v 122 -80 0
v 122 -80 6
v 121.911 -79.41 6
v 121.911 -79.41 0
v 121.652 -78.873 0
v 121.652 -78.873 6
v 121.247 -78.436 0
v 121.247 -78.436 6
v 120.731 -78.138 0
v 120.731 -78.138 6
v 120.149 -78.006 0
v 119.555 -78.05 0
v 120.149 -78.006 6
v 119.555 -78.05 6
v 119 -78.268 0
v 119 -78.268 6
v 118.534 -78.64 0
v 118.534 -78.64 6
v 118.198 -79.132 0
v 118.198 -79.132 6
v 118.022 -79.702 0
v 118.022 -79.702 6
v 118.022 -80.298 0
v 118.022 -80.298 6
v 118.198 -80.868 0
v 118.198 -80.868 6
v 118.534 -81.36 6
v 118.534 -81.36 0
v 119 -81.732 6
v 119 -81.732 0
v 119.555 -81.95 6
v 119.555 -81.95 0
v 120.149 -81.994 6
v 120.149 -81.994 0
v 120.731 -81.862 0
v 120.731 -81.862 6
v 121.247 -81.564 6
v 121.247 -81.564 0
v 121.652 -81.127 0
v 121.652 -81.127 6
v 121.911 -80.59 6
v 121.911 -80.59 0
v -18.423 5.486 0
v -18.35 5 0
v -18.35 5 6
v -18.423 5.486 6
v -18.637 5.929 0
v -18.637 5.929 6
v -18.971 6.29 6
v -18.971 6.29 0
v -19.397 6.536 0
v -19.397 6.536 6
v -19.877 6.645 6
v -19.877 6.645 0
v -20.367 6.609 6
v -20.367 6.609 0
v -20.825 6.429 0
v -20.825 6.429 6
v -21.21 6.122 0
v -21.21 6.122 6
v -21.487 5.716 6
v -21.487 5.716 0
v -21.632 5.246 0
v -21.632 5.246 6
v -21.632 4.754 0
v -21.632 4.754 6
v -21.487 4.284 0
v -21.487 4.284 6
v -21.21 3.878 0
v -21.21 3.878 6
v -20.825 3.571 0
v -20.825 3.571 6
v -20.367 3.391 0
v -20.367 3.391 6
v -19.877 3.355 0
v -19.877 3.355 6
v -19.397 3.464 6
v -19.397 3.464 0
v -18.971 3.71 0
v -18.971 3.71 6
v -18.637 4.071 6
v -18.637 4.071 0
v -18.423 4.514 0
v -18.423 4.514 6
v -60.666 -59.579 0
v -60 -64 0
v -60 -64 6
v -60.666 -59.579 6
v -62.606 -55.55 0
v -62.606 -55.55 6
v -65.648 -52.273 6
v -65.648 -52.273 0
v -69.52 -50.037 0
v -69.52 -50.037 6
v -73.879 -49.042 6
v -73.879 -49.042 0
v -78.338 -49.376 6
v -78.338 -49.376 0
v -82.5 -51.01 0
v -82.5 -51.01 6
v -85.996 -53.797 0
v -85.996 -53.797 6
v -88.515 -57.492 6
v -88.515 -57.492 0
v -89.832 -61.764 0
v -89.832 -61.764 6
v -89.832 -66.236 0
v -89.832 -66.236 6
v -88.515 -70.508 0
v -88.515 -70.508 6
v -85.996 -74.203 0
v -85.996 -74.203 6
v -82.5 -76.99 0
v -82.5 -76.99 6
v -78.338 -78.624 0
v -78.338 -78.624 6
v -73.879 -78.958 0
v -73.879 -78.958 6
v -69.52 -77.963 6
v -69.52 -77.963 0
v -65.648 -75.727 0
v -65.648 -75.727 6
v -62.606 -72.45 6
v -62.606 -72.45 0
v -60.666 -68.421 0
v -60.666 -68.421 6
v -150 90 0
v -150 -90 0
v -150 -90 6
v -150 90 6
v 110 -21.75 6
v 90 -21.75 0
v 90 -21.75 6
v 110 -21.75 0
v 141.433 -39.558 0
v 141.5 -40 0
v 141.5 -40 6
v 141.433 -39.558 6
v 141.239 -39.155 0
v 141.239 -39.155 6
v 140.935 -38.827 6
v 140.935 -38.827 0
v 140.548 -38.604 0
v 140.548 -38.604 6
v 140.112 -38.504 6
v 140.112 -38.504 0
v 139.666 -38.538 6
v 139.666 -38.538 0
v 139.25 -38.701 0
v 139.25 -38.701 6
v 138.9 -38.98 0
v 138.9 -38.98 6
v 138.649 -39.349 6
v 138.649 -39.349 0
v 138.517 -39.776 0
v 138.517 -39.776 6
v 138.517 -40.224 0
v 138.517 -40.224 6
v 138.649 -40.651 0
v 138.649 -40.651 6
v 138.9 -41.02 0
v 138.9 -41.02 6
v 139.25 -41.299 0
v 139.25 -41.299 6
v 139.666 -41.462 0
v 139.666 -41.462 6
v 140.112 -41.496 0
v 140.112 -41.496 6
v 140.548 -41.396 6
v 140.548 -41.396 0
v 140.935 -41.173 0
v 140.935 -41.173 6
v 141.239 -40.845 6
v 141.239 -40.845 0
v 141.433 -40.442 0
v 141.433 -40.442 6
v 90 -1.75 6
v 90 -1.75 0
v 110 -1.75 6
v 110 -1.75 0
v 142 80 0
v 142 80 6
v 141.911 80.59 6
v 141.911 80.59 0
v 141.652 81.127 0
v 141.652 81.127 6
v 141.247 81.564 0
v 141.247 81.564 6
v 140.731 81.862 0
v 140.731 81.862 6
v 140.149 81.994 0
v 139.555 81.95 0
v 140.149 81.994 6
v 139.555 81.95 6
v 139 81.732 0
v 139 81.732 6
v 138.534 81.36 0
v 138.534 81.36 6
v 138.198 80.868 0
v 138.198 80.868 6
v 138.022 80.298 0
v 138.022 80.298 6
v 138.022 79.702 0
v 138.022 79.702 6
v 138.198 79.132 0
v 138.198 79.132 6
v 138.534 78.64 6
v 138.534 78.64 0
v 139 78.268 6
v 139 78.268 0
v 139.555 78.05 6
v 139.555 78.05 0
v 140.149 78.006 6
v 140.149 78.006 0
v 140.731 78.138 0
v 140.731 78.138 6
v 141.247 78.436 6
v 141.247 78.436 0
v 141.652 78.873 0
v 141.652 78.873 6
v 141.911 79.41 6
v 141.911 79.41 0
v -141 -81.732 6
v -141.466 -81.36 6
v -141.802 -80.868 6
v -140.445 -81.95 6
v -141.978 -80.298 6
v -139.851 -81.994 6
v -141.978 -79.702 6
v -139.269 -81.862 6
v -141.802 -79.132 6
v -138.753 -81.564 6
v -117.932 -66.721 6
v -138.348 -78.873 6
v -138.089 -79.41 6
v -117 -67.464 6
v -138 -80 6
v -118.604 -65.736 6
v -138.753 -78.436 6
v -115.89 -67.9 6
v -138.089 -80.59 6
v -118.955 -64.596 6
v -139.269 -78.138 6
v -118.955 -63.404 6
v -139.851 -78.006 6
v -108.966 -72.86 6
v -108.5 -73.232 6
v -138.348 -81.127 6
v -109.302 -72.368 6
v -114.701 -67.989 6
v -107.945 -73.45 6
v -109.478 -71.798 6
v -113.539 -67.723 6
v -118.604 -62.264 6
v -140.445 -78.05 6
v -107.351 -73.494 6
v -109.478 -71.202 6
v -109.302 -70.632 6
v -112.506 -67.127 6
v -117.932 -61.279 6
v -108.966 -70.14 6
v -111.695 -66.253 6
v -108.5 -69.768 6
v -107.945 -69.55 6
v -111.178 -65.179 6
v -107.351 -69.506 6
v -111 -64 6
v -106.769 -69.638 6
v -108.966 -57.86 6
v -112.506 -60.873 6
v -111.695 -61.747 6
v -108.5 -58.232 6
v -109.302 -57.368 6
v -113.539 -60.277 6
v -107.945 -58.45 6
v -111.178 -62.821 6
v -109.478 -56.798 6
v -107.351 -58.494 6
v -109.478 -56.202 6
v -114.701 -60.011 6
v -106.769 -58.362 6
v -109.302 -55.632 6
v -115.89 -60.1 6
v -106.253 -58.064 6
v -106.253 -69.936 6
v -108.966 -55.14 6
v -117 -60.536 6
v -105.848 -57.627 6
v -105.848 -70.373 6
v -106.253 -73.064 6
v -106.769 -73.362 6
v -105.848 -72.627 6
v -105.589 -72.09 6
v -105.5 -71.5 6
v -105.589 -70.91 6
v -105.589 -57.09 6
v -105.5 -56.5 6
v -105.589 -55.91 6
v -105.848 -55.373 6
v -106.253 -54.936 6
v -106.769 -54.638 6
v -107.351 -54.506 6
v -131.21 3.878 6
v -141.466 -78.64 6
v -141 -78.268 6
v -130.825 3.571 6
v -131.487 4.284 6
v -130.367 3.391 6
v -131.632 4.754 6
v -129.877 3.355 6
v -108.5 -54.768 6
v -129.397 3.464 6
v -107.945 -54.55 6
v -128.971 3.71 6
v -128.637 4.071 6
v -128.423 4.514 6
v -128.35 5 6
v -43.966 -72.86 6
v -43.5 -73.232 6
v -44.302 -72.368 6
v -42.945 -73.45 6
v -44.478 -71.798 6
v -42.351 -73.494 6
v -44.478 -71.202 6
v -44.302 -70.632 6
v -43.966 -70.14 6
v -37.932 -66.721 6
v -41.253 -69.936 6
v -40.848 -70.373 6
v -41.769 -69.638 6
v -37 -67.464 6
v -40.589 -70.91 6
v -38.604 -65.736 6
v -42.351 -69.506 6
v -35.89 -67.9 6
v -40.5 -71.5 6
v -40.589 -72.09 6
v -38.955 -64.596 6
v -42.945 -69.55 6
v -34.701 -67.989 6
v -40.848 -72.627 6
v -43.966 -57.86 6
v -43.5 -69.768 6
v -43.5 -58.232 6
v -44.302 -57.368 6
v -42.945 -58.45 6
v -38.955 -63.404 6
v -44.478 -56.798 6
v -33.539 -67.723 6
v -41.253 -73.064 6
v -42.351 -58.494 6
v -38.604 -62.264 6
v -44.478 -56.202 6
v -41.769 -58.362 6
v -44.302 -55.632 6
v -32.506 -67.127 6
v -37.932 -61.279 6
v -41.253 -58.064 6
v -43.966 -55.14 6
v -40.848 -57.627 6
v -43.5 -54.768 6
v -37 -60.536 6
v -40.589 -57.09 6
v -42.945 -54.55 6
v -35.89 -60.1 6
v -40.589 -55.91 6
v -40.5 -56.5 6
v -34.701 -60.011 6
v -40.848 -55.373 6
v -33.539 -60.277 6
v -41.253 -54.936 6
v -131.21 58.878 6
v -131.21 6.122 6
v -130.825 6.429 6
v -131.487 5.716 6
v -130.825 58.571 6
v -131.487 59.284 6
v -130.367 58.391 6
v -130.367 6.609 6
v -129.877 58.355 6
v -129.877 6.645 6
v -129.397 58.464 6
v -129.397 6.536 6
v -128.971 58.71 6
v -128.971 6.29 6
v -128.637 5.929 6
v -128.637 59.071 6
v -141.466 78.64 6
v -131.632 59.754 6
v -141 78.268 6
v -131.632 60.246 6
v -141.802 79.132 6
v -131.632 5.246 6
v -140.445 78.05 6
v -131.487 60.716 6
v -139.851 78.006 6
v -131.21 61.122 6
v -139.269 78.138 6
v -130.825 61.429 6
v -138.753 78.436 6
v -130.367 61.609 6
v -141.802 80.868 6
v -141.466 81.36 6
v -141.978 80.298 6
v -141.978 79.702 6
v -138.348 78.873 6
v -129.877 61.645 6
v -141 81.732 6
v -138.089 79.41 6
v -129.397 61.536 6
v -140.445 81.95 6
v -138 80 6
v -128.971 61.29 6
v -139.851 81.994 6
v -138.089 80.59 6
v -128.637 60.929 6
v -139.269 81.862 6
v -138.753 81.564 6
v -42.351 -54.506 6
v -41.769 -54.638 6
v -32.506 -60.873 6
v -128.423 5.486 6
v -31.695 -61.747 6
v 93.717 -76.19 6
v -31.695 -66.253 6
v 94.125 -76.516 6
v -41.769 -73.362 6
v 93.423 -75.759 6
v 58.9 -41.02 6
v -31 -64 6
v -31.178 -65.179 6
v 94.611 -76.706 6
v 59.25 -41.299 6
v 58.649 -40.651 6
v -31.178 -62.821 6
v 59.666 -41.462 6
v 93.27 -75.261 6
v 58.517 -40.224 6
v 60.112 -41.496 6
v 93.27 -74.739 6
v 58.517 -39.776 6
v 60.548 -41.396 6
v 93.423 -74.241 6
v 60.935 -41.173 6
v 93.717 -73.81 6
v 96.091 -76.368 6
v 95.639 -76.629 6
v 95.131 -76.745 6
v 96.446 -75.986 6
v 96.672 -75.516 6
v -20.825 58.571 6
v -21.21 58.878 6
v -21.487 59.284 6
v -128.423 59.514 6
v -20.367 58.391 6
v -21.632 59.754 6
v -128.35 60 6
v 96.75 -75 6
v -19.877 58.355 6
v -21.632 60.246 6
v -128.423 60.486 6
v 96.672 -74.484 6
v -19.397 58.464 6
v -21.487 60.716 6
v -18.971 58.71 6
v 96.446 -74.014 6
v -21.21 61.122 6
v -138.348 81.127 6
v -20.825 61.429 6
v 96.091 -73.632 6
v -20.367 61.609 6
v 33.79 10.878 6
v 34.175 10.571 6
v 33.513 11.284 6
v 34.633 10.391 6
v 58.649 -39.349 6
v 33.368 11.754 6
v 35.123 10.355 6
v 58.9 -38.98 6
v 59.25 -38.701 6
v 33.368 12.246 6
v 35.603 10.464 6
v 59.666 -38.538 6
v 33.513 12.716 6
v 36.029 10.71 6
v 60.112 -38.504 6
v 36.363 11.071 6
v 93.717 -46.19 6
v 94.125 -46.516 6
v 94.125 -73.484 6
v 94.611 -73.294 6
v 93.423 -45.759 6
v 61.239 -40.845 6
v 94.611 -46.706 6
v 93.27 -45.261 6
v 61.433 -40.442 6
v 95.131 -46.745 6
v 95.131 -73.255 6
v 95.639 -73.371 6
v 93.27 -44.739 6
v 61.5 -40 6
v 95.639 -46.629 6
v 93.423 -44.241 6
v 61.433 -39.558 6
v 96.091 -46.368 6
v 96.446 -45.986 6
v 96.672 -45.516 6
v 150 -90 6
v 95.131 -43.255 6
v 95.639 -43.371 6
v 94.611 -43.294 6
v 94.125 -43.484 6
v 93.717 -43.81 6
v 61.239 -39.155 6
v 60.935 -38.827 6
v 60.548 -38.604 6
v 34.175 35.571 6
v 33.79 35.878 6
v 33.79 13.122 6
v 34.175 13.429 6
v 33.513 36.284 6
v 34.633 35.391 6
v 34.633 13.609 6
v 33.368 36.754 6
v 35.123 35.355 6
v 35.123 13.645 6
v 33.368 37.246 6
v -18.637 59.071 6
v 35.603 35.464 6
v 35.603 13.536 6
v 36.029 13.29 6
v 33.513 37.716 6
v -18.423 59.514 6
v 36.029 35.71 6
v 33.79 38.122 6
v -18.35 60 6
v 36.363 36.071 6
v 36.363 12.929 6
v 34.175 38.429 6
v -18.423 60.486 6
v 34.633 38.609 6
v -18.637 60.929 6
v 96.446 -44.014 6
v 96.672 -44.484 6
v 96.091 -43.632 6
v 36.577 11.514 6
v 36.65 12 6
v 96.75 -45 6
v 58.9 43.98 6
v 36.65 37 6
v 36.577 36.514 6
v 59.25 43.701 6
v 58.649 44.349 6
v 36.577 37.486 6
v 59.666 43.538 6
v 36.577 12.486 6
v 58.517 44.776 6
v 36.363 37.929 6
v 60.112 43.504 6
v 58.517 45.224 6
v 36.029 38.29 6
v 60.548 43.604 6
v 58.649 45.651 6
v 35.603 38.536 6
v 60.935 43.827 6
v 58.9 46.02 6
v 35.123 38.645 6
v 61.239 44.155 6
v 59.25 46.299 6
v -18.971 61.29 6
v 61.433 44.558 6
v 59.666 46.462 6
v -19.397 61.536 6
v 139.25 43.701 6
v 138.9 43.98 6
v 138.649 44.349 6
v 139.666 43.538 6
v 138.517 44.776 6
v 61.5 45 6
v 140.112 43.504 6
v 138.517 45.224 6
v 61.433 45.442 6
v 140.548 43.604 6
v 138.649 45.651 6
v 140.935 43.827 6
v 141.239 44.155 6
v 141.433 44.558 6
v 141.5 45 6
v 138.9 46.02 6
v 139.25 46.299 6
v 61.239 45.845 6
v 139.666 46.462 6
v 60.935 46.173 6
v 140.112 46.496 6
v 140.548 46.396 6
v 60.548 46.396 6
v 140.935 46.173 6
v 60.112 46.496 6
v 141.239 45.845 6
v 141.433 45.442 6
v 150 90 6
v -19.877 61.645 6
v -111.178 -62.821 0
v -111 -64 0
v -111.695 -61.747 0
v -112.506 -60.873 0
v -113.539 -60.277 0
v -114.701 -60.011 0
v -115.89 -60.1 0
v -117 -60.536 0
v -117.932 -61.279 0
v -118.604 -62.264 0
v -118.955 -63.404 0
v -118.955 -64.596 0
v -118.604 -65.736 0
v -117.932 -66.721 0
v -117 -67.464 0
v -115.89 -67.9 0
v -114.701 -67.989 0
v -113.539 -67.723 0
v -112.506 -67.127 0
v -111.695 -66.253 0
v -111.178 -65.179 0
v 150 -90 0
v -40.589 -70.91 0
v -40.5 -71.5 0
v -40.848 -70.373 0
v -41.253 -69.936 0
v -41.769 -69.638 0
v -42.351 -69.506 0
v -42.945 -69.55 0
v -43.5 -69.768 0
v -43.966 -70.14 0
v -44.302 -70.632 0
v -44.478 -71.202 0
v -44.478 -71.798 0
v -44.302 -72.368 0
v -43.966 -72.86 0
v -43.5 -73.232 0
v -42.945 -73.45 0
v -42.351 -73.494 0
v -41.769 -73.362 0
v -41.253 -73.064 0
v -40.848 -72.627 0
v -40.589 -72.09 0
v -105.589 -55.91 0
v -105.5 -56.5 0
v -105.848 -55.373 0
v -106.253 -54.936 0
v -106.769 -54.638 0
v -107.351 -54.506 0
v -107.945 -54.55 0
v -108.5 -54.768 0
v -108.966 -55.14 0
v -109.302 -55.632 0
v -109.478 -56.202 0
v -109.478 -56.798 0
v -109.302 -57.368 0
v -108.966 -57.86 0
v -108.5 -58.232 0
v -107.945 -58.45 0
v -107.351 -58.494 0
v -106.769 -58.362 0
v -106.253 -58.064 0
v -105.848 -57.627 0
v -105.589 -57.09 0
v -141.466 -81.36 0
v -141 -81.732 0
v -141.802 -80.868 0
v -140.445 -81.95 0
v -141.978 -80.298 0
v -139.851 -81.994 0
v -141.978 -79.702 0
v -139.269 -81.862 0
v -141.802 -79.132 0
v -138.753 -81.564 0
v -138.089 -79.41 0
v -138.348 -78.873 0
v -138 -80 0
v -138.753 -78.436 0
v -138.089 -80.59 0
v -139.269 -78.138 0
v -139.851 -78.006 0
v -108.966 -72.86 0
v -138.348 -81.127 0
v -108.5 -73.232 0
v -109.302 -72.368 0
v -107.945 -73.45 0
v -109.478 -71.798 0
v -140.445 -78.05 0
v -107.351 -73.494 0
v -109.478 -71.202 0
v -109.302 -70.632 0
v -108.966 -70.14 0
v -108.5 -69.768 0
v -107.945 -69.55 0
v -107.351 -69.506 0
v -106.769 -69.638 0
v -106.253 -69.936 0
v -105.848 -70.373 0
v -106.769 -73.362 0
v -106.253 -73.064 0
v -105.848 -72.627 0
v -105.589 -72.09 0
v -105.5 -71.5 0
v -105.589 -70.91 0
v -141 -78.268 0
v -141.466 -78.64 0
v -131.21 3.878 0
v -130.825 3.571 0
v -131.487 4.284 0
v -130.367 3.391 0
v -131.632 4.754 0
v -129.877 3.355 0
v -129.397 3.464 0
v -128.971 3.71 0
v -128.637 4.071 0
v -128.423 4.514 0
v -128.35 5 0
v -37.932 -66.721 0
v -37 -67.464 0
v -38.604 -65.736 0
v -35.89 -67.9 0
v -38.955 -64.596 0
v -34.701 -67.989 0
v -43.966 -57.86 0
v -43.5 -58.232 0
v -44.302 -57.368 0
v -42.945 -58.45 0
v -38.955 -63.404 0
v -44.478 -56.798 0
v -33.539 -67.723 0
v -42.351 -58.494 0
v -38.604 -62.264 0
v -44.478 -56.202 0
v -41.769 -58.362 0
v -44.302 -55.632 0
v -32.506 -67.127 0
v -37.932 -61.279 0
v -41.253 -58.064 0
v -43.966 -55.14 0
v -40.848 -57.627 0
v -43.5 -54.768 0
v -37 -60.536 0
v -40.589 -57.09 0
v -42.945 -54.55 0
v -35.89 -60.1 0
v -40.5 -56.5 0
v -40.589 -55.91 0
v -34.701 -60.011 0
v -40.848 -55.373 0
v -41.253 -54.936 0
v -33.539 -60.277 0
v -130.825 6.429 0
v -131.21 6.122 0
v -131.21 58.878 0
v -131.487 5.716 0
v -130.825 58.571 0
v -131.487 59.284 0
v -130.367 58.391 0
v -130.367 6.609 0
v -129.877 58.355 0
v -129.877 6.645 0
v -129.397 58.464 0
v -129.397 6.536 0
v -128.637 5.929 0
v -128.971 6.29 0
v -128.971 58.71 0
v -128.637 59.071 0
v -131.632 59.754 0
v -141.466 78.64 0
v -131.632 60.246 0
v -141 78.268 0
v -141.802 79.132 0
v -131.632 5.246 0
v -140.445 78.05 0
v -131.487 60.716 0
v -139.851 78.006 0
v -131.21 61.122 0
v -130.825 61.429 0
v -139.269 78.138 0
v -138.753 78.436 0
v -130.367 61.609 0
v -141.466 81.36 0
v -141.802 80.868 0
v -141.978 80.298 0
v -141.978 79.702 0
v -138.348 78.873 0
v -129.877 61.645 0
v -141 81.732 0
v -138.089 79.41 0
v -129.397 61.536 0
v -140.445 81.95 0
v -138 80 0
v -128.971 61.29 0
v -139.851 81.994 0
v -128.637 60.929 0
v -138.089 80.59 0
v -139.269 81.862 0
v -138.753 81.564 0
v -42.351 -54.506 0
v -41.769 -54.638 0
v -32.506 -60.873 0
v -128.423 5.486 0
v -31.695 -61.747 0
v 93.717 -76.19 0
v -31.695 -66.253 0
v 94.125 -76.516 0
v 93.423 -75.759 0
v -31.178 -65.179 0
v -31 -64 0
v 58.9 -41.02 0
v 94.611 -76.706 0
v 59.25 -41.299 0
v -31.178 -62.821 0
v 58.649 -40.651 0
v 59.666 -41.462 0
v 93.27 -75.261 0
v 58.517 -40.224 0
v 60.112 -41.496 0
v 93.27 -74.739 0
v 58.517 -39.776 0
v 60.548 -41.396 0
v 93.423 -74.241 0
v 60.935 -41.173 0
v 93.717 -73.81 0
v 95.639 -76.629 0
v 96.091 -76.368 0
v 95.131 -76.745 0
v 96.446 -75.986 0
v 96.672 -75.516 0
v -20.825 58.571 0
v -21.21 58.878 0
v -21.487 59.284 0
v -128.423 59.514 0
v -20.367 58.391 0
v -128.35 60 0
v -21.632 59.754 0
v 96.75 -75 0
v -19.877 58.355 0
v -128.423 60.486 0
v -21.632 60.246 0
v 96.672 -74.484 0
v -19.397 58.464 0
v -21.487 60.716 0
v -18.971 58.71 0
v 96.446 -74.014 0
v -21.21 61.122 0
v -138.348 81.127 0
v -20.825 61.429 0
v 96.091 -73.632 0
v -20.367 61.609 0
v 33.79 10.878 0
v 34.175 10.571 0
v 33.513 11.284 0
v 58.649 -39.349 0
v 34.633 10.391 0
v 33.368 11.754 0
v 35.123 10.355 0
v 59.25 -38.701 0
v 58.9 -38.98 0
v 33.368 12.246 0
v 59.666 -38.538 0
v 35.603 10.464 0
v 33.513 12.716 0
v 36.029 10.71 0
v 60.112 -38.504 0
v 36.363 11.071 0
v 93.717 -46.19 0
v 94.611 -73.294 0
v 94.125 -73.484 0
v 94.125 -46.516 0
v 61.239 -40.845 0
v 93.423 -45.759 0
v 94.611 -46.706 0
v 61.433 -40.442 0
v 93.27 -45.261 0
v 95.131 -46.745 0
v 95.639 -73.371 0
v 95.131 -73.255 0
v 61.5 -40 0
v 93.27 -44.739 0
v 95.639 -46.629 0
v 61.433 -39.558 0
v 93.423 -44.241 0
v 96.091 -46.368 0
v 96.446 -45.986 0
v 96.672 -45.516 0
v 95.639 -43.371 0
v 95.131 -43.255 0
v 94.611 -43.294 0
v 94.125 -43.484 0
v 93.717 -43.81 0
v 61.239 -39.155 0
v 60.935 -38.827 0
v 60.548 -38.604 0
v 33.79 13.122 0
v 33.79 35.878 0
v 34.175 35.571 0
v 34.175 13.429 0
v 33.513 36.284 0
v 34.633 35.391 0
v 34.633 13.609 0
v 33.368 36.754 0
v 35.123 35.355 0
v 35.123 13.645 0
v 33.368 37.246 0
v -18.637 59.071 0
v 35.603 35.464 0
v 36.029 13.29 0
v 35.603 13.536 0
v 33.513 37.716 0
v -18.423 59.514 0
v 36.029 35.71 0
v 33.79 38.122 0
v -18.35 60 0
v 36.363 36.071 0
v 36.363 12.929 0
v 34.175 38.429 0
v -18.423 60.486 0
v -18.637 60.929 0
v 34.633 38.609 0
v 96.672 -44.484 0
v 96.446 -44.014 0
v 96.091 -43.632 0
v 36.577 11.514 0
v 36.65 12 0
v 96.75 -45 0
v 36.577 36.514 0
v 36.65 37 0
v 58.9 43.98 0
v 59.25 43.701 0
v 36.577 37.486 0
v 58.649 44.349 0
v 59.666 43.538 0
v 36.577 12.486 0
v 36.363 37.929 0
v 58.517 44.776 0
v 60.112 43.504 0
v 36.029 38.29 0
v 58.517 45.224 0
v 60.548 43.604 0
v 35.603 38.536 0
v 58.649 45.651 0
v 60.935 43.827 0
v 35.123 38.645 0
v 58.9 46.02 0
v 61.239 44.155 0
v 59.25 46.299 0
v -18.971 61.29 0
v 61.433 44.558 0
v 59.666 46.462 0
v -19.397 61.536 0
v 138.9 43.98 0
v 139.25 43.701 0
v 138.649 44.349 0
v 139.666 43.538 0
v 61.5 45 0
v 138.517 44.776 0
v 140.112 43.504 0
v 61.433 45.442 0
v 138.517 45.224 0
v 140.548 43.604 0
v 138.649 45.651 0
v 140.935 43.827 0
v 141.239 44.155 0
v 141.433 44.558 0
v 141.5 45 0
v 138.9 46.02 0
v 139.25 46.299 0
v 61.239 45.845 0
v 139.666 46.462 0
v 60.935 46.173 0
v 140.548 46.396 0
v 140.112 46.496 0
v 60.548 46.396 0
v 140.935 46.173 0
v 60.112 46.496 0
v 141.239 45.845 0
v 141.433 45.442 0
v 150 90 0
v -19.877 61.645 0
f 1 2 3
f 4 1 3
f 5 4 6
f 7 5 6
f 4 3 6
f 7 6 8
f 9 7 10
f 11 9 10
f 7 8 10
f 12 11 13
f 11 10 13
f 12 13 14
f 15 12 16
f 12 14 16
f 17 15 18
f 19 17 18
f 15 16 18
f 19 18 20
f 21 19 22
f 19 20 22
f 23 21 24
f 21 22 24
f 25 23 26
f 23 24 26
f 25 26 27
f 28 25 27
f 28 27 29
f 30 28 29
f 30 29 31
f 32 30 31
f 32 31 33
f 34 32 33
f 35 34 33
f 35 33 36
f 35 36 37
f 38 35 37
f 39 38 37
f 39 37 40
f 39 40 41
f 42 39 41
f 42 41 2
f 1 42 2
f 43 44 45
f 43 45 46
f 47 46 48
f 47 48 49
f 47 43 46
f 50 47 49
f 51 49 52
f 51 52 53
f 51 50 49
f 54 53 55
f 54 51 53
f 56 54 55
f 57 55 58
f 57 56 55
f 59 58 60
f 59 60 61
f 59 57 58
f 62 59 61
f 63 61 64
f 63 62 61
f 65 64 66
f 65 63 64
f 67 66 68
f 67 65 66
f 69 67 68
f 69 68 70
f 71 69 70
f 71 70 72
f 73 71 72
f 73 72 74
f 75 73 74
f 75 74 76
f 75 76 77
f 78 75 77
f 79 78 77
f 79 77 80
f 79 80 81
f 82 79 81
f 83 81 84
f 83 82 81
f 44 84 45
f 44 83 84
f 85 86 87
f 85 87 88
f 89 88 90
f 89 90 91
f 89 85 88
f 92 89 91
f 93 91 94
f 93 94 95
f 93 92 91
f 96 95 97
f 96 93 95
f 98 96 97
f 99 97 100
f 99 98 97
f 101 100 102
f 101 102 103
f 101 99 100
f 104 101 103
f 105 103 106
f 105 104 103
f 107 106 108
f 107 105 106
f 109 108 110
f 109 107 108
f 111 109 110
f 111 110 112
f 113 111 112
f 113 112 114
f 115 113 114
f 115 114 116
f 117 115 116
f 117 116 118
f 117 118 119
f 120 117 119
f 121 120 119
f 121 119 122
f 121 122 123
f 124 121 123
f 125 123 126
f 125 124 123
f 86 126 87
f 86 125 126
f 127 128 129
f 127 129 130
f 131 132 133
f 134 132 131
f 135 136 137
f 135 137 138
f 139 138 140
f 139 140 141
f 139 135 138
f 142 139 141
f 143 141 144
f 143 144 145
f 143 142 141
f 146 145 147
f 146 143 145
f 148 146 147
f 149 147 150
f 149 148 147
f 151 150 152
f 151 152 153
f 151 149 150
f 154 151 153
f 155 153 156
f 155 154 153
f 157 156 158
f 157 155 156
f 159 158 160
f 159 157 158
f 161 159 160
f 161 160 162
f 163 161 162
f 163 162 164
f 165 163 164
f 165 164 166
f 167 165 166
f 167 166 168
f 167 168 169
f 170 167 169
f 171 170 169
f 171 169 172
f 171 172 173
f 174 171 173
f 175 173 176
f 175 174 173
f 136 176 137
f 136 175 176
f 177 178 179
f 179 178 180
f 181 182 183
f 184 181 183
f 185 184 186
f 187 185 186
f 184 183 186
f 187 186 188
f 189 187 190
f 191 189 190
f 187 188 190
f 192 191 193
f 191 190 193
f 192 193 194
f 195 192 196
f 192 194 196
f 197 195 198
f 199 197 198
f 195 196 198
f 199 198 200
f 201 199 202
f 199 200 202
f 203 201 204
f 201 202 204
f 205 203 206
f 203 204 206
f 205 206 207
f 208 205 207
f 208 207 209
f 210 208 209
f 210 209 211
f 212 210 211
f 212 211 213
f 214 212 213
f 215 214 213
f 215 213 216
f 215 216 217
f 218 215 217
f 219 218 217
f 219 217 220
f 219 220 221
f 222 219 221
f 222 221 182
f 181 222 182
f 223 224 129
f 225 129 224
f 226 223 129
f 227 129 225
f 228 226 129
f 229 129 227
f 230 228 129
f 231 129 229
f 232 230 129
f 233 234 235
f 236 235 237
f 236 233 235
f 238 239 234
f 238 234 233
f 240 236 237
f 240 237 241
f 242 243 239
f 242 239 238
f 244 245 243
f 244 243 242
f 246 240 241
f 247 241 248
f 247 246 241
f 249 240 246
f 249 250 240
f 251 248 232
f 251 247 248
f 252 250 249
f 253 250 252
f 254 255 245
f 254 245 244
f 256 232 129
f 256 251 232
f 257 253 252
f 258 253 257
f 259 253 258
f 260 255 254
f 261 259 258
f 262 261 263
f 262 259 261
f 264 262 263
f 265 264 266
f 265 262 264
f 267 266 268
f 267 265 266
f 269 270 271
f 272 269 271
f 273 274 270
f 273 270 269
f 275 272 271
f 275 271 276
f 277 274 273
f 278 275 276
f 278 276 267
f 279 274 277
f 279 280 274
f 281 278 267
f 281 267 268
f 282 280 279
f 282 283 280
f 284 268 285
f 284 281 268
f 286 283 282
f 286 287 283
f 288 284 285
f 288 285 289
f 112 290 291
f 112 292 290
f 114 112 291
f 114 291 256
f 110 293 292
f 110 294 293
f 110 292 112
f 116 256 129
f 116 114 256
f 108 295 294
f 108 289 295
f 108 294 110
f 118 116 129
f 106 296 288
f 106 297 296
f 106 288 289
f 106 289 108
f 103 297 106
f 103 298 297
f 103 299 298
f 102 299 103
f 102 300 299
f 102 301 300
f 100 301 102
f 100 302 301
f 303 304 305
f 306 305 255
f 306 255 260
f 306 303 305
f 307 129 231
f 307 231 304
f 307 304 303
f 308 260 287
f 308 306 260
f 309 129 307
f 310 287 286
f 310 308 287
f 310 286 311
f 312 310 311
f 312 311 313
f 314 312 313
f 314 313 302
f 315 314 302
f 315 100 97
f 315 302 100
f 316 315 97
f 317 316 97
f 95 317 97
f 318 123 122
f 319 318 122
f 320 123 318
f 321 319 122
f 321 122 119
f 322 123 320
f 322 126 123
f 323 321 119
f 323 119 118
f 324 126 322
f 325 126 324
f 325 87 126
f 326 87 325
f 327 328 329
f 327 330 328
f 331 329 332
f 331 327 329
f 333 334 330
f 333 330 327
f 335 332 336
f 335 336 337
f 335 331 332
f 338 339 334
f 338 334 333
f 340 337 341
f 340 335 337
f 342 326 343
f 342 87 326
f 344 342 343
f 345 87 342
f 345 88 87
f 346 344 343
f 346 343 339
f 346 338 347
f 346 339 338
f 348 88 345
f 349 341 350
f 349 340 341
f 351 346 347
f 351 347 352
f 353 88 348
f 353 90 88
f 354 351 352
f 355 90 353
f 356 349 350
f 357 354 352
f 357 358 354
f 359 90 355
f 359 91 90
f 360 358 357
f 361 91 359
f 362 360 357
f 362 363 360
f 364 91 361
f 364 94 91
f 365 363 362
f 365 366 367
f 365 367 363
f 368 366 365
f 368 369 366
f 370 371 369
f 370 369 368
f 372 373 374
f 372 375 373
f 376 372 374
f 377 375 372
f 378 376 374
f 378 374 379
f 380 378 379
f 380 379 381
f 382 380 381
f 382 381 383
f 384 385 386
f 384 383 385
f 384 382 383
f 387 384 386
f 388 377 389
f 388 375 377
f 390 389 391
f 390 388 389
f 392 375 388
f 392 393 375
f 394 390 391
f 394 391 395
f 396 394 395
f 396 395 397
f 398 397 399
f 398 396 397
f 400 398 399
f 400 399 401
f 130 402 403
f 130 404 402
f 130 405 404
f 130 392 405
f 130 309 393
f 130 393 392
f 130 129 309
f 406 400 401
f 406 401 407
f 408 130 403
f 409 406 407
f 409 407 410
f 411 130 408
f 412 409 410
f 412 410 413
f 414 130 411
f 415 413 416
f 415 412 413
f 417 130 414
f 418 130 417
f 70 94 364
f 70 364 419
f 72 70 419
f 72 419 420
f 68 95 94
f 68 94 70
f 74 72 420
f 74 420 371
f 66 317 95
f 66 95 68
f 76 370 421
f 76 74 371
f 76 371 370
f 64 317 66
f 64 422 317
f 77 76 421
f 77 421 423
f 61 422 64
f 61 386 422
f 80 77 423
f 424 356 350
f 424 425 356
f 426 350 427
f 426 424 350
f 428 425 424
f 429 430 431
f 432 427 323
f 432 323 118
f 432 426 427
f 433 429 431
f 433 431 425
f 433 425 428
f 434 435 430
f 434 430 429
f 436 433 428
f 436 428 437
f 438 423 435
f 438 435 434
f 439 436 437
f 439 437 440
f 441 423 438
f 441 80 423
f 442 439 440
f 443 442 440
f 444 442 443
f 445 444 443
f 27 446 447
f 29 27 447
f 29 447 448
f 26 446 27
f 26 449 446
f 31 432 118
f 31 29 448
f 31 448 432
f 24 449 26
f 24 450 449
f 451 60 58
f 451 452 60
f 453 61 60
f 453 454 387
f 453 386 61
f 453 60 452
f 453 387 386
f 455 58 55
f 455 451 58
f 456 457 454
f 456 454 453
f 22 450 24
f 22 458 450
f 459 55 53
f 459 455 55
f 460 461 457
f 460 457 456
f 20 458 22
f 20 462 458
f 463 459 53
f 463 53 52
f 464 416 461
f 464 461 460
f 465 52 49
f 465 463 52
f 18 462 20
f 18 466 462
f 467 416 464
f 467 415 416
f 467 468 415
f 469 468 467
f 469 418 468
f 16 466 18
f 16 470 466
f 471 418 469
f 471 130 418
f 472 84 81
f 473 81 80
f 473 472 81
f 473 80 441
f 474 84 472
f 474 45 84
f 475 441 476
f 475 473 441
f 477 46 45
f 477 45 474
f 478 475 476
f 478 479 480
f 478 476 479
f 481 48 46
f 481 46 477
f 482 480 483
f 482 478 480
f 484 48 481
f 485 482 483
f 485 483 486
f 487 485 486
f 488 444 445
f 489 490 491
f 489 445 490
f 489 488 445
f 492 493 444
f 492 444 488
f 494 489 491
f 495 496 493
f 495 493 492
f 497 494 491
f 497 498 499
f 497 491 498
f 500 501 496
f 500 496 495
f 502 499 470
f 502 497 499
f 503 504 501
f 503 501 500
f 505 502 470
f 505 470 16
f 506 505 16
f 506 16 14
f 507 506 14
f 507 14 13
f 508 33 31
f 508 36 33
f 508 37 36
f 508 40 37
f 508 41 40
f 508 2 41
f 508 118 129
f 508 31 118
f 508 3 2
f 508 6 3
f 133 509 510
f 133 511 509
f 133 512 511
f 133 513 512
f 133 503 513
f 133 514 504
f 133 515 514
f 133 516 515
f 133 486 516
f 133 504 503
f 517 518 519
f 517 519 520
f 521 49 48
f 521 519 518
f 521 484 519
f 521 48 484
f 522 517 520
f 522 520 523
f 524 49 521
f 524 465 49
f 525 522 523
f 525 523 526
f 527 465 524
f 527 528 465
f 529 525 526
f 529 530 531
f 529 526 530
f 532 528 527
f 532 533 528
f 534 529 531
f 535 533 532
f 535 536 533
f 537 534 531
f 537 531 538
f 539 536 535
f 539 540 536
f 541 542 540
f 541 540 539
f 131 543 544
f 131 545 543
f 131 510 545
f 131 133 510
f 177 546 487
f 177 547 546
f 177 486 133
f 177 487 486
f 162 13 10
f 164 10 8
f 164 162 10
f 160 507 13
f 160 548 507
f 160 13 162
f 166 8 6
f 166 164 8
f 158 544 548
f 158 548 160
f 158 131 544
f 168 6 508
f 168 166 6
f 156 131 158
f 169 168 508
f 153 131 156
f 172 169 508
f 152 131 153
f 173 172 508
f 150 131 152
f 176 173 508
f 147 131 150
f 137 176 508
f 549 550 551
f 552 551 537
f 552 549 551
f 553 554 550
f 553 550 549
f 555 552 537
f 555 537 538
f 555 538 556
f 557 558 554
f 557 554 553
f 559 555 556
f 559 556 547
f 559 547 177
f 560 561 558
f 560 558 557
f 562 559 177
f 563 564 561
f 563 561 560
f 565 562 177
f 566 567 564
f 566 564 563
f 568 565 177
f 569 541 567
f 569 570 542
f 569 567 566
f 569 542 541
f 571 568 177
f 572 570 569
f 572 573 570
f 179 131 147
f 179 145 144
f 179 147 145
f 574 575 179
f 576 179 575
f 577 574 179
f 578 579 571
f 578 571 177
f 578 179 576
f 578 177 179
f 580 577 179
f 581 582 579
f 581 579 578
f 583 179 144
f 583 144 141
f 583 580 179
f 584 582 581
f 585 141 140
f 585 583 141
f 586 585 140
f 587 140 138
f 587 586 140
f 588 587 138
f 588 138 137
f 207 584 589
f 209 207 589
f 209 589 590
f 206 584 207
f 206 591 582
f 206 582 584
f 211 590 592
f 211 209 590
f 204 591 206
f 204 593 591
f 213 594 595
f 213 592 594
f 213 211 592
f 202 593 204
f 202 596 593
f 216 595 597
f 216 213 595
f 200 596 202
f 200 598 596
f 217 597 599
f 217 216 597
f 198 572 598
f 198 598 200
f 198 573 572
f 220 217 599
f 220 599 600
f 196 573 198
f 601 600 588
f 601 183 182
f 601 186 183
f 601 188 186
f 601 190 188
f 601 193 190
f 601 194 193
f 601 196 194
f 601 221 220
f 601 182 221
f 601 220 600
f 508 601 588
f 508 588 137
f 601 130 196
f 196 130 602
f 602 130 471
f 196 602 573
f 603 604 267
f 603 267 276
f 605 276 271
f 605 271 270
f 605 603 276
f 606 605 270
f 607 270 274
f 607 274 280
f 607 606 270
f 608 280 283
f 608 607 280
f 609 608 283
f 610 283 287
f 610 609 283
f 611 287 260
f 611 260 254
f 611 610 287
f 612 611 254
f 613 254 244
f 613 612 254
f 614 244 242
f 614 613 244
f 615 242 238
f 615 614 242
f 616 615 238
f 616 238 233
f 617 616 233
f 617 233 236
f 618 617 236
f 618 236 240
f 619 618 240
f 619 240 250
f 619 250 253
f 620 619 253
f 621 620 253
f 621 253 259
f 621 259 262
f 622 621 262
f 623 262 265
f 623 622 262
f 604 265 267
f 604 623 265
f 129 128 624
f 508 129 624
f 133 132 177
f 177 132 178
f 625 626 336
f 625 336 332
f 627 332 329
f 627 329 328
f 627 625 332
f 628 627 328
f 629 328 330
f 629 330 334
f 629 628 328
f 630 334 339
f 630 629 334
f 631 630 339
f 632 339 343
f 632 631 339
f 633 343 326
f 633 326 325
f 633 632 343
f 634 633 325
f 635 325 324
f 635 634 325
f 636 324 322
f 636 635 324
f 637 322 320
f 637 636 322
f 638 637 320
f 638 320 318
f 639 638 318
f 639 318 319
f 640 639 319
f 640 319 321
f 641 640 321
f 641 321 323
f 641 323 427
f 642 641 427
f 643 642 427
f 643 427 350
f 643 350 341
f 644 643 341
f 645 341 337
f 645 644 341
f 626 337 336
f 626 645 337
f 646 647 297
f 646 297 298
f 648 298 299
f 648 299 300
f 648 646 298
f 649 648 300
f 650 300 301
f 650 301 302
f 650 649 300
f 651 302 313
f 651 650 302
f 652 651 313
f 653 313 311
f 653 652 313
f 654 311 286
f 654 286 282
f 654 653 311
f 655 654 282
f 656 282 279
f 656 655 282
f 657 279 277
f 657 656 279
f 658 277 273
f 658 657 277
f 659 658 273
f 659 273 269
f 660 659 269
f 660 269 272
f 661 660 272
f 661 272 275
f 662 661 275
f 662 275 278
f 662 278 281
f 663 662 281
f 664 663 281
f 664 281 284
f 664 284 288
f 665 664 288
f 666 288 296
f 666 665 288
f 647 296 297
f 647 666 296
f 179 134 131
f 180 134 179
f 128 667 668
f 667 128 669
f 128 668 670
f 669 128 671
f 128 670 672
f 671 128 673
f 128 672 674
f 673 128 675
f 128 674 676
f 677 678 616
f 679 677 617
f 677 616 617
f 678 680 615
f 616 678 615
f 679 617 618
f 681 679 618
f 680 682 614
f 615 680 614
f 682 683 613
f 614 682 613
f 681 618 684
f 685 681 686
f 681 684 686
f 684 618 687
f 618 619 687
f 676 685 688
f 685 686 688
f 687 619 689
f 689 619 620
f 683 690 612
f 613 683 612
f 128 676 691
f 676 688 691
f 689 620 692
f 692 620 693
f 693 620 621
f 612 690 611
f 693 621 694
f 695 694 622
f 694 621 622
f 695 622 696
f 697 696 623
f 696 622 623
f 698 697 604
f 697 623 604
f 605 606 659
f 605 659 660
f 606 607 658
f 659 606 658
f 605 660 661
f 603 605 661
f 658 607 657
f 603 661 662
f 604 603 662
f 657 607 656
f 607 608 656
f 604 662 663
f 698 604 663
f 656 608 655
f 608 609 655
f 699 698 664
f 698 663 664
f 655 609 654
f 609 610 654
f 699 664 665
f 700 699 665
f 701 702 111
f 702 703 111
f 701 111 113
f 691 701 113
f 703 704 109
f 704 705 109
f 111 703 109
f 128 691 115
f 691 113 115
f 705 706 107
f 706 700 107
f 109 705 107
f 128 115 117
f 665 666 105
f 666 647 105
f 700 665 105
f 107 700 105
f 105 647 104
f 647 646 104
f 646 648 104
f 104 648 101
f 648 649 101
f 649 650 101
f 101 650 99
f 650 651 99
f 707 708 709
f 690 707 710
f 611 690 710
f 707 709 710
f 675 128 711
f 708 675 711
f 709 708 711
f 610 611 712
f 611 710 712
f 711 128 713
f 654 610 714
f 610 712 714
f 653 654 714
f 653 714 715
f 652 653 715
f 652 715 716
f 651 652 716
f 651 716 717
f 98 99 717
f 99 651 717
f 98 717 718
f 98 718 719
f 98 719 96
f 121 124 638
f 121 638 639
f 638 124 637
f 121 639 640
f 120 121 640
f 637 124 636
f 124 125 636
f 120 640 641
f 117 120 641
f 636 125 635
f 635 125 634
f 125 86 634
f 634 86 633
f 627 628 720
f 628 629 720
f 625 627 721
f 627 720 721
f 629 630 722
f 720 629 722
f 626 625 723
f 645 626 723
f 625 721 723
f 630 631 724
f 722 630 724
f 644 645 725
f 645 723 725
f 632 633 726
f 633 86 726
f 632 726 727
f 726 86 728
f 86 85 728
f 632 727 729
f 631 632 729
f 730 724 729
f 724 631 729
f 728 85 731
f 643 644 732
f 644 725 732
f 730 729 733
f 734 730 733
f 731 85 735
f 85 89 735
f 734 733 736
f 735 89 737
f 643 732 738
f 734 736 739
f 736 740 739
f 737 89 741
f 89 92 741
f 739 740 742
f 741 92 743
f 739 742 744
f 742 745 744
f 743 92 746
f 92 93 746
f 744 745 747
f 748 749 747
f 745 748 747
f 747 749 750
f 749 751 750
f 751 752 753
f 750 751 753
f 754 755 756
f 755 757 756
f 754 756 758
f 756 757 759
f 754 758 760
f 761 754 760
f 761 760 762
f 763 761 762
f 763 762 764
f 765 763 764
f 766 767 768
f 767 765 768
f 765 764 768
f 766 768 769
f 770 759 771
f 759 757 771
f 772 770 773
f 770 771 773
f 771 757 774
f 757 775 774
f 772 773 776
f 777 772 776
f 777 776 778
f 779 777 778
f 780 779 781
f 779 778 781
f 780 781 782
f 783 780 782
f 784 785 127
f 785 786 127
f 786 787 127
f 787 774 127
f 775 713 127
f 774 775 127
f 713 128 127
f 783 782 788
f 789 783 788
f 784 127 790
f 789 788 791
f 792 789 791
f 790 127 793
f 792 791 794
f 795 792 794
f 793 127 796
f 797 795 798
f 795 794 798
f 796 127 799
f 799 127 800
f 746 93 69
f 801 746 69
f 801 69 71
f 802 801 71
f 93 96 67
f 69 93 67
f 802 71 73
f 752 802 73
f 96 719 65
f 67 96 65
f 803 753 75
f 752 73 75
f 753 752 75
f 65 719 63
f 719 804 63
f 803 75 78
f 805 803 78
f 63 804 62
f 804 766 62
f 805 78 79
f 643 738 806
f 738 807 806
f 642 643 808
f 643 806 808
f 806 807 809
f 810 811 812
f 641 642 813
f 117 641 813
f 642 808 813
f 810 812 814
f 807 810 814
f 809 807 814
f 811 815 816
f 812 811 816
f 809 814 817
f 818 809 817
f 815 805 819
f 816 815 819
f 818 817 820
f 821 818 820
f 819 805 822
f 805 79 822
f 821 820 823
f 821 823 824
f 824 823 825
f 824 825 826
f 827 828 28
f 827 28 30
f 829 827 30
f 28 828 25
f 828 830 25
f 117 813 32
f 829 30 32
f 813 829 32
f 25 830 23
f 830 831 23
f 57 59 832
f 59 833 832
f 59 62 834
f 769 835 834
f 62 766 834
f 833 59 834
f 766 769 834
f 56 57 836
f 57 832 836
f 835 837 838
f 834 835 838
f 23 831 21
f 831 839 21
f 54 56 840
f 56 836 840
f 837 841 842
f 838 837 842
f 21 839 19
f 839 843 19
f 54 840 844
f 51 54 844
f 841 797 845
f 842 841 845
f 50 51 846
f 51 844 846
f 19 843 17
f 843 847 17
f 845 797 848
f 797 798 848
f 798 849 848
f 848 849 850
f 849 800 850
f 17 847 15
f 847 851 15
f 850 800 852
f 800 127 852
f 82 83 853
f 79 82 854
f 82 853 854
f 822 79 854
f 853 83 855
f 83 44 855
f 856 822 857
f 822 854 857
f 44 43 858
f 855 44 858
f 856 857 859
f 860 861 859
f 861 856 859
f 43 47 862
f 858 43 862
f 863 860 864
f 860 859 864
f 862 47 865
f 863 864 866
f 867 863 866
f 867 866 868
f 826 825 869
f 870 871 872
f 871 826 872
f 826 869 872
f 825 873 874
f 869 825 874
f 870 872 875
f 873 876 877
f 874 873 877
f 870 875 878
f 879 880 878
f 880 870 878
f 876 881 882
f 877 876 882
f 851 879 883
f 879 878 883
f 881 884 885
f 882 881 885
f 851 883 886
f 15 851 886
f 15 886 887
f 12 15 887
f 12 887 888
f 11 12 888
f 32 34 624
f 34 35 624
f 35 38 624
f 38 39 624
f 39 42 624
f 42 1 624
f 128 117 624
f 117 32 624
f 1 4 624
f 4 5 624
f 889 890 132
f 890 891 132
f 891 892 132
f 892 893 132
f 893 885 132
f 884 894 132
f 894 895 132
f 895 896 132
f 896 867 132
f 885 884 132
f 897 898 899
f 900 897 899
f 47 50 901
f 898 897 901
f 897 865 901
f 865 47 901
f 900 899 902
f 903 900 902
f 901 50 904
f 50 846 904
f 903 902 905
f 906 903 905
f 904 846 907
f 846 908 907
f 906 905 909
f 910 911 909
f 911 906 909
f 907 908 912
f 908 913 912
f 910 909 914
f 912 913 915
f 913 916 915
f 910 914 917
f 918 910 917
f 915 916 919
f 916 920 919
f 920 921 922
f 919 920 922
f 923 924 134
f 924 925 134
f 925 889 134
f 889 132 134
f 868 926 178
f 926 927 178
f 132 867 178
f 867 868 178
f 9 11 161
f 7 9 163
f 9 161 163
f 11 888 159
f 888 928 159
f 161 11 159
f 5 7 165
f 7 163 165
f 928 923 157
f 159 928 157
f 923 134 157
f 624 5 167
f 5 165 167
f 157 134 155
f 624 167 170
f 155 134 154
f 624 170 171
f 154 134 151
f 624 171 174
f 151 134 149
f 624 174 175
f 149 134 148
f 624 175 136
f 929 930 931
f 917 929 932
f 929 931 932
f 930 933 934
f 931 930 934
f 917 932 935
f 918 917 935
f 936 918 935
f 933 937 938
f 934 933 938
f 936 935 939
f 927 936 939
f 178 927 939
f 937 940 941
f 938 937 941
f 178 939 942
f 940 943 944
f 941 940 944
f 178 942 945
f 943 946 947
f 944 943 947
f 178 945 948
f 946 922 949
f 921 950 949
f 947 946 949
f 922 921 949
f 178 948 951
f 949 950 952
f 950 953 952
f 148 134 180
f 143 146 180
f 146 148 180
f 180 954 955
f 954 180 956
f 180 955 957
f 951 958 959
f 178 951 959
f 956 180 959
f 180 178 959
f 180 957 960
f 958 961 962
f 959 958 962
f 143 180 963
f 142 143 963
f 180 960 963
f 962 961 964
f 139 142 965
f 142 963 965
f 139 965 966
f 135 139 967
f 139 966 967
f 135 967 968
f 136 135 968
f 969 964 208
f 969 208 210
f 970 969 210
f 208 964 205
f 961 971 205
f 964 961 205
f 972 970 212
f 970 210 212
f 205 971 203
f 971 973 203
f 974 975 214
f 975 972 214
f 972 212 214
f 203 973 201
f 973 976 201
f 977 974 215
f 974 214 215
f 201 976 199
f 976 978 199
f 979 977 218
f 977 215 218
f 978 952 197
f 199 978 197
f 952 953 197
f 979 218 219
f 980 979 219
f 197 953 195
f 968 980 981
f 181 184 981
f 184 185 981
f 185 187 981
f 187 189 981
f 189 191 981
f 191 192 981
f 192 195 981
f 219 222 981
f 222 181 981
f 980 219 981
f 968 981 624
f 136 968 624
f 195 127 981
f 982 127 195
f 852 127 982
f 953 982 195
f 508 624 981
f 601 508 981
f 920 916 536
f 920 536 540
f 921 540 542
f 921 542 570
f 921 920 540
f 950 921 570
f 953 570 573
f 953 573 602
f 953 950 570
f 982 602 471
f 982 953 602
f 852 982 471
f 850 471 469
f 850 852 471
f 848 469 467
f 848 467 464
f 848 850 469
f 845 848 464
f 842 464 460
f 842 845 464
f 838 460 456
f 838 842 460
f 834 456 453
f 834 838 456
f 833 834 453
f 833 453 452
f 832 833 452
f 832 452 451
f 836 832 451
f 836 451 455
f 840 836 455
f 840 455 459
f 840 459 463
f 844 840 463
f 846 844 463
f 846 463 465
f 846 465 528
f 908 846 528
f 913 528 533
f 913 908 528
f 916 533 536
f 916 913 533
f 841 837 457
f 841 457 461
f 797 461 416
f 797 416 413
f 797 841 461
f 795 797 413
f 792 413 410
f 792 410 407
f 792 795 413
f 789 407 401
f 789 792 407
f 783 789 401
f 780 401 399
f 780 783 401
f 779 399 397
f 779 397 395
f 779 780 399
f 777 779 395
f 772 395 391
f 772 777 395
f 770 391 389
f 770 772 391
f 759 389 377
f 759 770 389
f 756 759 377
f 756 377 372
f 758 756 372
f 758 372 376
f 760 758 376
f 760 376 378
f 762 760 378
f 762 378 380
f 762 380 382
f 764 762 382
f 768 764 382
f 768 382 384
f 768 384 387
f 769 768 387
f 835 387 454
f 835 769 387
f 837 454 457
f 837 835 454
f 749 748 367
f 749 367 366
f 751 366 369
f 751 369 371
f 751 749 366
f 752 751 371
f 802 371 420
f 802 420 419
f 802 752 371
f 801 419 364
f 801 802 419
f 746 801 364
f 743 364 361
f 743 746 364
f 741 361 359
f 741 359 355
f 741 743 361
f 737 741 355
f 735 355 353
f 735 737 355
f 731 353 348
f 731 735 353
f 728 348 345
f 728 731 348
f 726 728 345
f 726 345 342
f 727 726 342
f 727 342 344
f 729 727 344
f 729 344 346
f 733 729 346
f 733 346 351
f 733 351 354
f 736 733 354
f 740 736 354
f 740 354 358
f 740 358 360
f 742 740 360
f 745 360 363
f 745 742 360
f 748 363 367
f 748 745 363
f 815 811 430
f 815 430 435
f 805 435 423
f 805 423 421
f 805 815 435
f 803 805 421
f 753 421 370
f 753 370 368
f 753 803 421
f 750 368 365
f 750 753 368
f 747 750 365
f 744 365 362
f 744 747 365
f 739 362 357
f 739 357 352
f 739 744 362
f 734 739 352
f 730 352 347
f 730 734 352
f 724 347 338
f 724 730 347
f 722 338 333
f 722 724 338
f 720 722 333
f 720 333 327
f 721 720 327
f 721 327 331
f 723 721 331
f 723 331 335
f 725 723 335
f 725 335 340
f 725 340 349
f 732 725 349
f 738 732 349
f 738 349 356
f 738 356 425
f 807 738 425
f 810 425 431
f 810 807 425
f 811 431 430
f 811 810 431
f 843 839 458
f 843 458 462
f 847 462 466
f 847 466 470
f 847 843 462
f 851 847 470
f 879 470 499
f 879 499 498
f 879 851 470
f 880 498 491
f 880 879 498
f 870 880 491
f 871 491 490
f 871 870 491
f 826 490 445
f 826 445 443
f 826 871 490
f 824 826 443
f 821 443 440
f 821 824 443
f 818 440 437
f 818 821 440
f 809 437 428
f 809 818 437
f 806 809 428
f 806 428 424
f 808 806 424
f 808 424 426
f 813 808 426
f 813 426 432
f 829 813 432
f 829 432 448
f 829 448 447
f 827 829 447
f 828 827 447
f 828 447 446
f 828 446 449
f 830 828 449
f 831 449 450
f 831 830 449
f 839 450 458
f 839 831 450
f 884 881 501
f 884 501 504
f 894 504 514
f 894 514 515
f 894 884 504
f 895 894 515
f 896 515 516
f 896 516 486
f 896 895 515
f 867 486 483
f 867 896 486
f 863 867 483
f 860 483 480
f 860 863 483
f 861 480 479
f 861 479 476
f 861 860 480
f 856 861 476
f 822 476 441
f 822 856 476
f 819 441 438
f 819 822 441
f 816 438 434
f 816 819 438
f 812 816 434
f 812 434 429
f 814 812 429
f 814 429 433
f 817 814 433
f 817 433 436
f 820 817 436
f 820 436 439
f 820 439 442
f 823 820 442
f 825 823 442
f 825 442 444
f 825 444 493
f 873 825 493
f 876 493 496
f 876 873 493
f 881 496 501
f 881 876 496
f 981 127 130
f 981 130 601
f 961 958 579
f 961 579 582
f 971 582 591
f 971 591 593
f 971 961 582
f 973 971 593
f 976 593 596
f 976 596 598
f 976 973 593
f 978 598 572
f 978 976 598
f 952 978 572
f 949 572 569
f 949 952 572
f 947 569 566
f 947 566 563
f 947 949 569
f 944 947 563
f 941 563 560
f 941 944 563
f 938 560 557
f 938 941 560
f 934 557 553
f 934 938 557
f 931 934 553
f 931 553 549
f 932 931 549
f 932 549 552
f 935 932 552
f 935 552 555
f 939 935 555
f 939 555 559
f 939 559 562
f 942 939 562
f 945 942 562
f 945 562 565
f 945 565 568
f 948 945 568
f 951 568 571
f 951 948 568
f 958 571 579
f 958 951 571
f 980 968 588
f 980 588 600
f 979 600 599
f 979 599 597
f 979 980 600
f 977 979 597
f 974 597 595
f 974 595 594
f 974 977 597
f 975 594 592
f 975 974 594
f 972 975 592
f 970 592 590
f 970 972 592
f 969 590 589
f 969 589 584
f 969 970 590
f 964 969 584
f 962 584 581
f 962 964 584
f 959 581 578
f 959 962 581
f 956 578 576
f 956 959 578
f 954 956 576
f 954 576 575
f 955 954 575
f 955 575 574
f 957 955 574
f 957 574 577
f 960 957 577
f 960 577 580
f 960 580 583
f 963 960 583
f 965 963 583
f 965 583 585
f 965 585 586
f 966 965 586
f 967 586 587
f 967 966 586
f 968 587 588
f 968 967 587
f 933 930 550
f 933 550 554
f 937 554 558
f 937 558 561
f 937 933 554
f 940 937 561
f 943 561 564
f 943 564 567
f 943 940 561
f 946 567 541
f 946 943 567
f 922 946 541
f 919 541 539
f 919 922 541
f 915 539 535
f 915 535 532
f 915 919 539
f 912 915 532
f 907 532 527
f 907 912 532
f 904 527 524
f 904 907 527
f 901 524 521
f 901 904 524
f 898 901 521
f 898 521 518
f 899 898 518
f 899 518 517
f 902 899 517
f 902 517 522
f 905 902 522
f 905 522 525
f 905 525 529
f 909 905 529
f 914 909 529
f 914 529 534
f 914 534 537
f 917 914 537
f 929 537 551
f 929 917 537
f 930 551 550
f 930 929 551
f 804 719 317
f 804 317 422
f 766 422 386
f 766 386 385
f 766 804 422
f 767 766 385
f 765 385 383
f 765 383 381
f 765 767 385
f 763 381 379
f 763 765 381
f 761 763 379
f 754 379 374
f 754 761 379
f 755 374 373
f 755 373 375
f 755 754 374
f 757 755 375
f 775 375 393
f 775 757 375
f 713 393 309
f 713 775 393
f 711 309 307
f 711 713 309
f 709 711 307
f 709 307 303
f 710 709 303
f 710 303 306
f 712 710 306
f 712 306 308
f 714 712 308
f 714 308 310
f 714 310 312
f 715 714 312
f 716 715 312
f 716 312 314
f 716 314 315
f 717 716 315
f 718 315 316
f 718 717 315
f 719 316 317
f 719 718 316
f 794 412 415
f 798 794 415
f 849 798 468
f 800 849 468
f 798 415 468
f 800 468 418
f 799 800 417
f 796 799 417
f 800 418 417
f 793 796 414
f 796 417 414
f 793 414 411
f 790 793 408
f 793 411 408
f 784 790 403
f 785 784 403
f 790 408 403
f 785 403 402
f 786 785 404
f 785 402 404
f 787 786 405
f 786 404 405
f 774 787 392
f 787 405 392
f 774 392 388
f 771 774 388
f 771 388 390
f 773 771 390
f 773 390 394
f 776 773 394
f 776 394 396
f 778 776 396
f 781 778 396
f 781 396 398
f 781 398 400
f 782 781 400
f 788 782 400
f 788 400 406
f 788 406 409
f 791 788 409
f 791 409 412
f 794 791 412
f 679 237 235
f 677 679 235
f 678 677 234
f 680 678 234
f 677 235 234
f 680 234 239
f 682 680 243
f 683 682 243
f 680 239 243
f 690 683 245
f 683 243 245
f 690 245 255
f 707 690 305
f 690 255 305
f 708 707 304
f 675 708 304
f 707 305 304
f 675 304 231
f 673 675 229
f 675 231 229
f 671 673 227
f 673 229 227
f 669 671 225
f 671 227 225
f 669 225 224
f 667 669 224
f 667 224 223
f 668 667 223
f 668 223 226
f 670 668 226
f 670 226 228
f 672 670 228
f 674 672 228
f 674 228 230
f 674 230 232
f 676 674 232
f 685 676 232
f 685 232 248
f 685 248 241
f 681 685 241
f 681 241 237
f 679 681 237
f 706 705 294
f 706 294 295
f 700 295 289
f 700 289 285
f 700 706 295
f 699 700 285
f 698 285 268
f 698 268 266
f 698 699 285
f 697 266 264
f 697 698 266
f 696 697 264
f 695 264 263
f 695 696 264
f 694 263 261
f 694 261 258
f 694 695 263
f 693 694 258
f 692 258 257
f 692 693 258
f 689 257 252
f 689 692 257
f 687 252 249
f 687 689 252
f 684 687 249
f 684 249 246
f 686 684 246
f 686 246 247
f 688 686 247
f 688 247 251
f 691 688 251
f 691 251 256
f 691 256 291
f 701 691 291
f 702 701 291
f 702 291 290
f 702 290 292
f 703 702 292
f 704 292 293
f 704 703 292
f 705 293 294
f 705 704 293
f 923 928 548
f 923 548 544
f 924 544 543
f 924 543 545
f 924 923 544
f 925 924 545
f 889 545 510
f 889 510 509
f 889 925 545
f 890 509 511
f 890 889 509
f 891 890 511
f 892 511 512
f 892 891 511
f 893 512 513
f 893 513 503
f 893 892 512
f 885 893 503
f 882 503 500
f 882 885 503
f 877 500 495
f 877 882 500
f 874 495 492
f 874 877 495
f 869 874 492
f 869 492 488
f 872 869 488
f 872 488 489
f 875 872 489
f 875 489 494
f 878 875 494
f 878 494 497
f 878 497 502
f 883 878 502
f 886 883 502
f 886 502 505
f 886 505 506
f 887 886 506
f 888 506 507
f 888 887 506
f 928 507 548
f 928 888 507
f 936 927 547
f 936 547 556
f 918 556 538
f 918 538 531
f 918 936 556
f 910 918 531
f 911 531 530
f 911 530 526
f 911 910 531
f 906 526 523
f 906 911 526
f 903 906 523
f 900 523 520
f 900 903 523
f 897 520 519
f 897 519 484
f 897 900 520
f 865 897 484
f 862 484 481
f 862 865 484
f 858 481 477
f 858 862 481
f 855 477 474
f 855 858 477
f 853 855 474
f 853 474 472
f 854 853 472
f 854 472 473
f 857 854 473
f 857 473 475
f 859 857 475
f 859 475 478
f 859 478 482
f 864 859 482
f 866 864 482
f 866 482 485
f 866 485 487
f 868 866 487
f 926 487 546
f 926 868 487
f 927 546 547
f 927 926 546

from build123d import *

# Parameters (mm, degrees)
ESBO_O1_W                = 300
ESBO_O1_H                = 180
ESBO_O1_R                = 1.5
ESBO_O1_R_2              = 2
ESBO_O1_R_3              = 15
ESBO_O1_R_4              = 4
ESBO_O1_R_5              = 1.65
ESBO_O1_R_6              = 1.75
ESBO_O1_W_2              = 20
ESBO_O1_H_2              = 20
RESSALTO_EXTRUS_O1_DEPTH = 6
ESBO_O2_R                = 2
CORTE_EXTRUS_O1_DEPTH    = 10


with BuildPart() as part:
    # Esboço1 → Ressalto-extrusão1 (new body)
    with BuildSketch(Plane.XY):
        Rectangle(ESBO_O1_W, ESBO_O1_H)
        with Locations((140, 45)):
            Circle(ESBO_O1_R, mode=Mode.SUBTRACT)
        with Locations((140, -40)):
            Circle(ESBO_O1_R, mode=Mode.SUBTRACT)
        with Locations((60, -40)):
            Circle(ESBO_O1_R, mode=Mode.SUBTRACT)
        with Locations((60, 45)):
            Circle(ESBO_O1_R, mode=Mode.SUBTRACT)
        with Locations((-107.5, -56.5)):
            Circle(ESBO_O1_R_2, mode=Mode.SUBTRACT)
        with Locations((-42.5, -56.5)):
            Circle(ESBO_O1_R_2, mode=Mode.SUBTRACT)
        with Locations((-75, -64)):
            Circle(ESBO_O1_R_3, mode=Mode.SUBTRACT)
        with Locations((-35, -64)):
            Circle(ESBO_O1_R_4, mode=Mode.SUBTRACT)
        with Locations((-115, -64)):
            Circle(ESBO_O1_R_4, mode=Mode.SUBTRACT)
        with Locations((-42.5, -71.5)):
            Circle(ESBO_O1_R_2, mode=Mode.SUBTRACT)
        with Locations((-107.5, -71.5)):
            Circle(ESBO_O1_R_2, mode=Mode.SUBTRACT)
        with Locations((35, 37)):
            Circle(ESBO_O1_R_5, mode=Mode.SUBTRACT)
        with Locations((35, 12)):
            Circle(ESBO_O1_R_5, mode=Mode.SUBTRACT)
        with Locations((-130, 60)):
            Circle(ESBO_O1_R_5, mode=Mode.SUBTRACT)
        with Locations((-20, 60)):
            Circle(ESBO_O1_R_5, mode=Mode.SUBTRACT)
        with Locations((-20, 5)):
            Circle(ESBO_O1_R_5, mode=Mode.SUBTRACT)
        with Locations((-130, 5)):
            Circle(ESBO_O1_R_5, mode=Mode.SUBTRACT)
        with Locations((95, -45)):
            Circle(ESBO_O1_R_6, mode=Mode.SUBTRACT)
        with Locations((95, -75)):
            Circle(ESBO_O1_R_6, mode=Mode.SUBTRACT)
        with Locations((100, -11.75)):
            Rectangle(ESBO_O1_W_2, ESBO_O1_H_2, mode=Mode.SUBTRACT)
    extrude(amount=RESSALTO_EXTRUS_O1_DEPTH)

    # Esboço2 → Corte-extrusão1 (cut)
    with BuildSketch(Plane.XY.offset(6)):
        with Locations((-140, 80)):
            Circle(ESBO_O2_R)
        with Locations((140, 80)):
            Circle(ESBO_O2_R)
        with Locations((120, -80)):
            Circle(ESBO_O2_R)
        with Locations((-140, -80)):
            Circle(ESBO_O2_R)
    extrude(amount=-CORTE_EXTRUS_O1_DEPTH, mode=Mode.SUBTRACT)


solid = part.part
